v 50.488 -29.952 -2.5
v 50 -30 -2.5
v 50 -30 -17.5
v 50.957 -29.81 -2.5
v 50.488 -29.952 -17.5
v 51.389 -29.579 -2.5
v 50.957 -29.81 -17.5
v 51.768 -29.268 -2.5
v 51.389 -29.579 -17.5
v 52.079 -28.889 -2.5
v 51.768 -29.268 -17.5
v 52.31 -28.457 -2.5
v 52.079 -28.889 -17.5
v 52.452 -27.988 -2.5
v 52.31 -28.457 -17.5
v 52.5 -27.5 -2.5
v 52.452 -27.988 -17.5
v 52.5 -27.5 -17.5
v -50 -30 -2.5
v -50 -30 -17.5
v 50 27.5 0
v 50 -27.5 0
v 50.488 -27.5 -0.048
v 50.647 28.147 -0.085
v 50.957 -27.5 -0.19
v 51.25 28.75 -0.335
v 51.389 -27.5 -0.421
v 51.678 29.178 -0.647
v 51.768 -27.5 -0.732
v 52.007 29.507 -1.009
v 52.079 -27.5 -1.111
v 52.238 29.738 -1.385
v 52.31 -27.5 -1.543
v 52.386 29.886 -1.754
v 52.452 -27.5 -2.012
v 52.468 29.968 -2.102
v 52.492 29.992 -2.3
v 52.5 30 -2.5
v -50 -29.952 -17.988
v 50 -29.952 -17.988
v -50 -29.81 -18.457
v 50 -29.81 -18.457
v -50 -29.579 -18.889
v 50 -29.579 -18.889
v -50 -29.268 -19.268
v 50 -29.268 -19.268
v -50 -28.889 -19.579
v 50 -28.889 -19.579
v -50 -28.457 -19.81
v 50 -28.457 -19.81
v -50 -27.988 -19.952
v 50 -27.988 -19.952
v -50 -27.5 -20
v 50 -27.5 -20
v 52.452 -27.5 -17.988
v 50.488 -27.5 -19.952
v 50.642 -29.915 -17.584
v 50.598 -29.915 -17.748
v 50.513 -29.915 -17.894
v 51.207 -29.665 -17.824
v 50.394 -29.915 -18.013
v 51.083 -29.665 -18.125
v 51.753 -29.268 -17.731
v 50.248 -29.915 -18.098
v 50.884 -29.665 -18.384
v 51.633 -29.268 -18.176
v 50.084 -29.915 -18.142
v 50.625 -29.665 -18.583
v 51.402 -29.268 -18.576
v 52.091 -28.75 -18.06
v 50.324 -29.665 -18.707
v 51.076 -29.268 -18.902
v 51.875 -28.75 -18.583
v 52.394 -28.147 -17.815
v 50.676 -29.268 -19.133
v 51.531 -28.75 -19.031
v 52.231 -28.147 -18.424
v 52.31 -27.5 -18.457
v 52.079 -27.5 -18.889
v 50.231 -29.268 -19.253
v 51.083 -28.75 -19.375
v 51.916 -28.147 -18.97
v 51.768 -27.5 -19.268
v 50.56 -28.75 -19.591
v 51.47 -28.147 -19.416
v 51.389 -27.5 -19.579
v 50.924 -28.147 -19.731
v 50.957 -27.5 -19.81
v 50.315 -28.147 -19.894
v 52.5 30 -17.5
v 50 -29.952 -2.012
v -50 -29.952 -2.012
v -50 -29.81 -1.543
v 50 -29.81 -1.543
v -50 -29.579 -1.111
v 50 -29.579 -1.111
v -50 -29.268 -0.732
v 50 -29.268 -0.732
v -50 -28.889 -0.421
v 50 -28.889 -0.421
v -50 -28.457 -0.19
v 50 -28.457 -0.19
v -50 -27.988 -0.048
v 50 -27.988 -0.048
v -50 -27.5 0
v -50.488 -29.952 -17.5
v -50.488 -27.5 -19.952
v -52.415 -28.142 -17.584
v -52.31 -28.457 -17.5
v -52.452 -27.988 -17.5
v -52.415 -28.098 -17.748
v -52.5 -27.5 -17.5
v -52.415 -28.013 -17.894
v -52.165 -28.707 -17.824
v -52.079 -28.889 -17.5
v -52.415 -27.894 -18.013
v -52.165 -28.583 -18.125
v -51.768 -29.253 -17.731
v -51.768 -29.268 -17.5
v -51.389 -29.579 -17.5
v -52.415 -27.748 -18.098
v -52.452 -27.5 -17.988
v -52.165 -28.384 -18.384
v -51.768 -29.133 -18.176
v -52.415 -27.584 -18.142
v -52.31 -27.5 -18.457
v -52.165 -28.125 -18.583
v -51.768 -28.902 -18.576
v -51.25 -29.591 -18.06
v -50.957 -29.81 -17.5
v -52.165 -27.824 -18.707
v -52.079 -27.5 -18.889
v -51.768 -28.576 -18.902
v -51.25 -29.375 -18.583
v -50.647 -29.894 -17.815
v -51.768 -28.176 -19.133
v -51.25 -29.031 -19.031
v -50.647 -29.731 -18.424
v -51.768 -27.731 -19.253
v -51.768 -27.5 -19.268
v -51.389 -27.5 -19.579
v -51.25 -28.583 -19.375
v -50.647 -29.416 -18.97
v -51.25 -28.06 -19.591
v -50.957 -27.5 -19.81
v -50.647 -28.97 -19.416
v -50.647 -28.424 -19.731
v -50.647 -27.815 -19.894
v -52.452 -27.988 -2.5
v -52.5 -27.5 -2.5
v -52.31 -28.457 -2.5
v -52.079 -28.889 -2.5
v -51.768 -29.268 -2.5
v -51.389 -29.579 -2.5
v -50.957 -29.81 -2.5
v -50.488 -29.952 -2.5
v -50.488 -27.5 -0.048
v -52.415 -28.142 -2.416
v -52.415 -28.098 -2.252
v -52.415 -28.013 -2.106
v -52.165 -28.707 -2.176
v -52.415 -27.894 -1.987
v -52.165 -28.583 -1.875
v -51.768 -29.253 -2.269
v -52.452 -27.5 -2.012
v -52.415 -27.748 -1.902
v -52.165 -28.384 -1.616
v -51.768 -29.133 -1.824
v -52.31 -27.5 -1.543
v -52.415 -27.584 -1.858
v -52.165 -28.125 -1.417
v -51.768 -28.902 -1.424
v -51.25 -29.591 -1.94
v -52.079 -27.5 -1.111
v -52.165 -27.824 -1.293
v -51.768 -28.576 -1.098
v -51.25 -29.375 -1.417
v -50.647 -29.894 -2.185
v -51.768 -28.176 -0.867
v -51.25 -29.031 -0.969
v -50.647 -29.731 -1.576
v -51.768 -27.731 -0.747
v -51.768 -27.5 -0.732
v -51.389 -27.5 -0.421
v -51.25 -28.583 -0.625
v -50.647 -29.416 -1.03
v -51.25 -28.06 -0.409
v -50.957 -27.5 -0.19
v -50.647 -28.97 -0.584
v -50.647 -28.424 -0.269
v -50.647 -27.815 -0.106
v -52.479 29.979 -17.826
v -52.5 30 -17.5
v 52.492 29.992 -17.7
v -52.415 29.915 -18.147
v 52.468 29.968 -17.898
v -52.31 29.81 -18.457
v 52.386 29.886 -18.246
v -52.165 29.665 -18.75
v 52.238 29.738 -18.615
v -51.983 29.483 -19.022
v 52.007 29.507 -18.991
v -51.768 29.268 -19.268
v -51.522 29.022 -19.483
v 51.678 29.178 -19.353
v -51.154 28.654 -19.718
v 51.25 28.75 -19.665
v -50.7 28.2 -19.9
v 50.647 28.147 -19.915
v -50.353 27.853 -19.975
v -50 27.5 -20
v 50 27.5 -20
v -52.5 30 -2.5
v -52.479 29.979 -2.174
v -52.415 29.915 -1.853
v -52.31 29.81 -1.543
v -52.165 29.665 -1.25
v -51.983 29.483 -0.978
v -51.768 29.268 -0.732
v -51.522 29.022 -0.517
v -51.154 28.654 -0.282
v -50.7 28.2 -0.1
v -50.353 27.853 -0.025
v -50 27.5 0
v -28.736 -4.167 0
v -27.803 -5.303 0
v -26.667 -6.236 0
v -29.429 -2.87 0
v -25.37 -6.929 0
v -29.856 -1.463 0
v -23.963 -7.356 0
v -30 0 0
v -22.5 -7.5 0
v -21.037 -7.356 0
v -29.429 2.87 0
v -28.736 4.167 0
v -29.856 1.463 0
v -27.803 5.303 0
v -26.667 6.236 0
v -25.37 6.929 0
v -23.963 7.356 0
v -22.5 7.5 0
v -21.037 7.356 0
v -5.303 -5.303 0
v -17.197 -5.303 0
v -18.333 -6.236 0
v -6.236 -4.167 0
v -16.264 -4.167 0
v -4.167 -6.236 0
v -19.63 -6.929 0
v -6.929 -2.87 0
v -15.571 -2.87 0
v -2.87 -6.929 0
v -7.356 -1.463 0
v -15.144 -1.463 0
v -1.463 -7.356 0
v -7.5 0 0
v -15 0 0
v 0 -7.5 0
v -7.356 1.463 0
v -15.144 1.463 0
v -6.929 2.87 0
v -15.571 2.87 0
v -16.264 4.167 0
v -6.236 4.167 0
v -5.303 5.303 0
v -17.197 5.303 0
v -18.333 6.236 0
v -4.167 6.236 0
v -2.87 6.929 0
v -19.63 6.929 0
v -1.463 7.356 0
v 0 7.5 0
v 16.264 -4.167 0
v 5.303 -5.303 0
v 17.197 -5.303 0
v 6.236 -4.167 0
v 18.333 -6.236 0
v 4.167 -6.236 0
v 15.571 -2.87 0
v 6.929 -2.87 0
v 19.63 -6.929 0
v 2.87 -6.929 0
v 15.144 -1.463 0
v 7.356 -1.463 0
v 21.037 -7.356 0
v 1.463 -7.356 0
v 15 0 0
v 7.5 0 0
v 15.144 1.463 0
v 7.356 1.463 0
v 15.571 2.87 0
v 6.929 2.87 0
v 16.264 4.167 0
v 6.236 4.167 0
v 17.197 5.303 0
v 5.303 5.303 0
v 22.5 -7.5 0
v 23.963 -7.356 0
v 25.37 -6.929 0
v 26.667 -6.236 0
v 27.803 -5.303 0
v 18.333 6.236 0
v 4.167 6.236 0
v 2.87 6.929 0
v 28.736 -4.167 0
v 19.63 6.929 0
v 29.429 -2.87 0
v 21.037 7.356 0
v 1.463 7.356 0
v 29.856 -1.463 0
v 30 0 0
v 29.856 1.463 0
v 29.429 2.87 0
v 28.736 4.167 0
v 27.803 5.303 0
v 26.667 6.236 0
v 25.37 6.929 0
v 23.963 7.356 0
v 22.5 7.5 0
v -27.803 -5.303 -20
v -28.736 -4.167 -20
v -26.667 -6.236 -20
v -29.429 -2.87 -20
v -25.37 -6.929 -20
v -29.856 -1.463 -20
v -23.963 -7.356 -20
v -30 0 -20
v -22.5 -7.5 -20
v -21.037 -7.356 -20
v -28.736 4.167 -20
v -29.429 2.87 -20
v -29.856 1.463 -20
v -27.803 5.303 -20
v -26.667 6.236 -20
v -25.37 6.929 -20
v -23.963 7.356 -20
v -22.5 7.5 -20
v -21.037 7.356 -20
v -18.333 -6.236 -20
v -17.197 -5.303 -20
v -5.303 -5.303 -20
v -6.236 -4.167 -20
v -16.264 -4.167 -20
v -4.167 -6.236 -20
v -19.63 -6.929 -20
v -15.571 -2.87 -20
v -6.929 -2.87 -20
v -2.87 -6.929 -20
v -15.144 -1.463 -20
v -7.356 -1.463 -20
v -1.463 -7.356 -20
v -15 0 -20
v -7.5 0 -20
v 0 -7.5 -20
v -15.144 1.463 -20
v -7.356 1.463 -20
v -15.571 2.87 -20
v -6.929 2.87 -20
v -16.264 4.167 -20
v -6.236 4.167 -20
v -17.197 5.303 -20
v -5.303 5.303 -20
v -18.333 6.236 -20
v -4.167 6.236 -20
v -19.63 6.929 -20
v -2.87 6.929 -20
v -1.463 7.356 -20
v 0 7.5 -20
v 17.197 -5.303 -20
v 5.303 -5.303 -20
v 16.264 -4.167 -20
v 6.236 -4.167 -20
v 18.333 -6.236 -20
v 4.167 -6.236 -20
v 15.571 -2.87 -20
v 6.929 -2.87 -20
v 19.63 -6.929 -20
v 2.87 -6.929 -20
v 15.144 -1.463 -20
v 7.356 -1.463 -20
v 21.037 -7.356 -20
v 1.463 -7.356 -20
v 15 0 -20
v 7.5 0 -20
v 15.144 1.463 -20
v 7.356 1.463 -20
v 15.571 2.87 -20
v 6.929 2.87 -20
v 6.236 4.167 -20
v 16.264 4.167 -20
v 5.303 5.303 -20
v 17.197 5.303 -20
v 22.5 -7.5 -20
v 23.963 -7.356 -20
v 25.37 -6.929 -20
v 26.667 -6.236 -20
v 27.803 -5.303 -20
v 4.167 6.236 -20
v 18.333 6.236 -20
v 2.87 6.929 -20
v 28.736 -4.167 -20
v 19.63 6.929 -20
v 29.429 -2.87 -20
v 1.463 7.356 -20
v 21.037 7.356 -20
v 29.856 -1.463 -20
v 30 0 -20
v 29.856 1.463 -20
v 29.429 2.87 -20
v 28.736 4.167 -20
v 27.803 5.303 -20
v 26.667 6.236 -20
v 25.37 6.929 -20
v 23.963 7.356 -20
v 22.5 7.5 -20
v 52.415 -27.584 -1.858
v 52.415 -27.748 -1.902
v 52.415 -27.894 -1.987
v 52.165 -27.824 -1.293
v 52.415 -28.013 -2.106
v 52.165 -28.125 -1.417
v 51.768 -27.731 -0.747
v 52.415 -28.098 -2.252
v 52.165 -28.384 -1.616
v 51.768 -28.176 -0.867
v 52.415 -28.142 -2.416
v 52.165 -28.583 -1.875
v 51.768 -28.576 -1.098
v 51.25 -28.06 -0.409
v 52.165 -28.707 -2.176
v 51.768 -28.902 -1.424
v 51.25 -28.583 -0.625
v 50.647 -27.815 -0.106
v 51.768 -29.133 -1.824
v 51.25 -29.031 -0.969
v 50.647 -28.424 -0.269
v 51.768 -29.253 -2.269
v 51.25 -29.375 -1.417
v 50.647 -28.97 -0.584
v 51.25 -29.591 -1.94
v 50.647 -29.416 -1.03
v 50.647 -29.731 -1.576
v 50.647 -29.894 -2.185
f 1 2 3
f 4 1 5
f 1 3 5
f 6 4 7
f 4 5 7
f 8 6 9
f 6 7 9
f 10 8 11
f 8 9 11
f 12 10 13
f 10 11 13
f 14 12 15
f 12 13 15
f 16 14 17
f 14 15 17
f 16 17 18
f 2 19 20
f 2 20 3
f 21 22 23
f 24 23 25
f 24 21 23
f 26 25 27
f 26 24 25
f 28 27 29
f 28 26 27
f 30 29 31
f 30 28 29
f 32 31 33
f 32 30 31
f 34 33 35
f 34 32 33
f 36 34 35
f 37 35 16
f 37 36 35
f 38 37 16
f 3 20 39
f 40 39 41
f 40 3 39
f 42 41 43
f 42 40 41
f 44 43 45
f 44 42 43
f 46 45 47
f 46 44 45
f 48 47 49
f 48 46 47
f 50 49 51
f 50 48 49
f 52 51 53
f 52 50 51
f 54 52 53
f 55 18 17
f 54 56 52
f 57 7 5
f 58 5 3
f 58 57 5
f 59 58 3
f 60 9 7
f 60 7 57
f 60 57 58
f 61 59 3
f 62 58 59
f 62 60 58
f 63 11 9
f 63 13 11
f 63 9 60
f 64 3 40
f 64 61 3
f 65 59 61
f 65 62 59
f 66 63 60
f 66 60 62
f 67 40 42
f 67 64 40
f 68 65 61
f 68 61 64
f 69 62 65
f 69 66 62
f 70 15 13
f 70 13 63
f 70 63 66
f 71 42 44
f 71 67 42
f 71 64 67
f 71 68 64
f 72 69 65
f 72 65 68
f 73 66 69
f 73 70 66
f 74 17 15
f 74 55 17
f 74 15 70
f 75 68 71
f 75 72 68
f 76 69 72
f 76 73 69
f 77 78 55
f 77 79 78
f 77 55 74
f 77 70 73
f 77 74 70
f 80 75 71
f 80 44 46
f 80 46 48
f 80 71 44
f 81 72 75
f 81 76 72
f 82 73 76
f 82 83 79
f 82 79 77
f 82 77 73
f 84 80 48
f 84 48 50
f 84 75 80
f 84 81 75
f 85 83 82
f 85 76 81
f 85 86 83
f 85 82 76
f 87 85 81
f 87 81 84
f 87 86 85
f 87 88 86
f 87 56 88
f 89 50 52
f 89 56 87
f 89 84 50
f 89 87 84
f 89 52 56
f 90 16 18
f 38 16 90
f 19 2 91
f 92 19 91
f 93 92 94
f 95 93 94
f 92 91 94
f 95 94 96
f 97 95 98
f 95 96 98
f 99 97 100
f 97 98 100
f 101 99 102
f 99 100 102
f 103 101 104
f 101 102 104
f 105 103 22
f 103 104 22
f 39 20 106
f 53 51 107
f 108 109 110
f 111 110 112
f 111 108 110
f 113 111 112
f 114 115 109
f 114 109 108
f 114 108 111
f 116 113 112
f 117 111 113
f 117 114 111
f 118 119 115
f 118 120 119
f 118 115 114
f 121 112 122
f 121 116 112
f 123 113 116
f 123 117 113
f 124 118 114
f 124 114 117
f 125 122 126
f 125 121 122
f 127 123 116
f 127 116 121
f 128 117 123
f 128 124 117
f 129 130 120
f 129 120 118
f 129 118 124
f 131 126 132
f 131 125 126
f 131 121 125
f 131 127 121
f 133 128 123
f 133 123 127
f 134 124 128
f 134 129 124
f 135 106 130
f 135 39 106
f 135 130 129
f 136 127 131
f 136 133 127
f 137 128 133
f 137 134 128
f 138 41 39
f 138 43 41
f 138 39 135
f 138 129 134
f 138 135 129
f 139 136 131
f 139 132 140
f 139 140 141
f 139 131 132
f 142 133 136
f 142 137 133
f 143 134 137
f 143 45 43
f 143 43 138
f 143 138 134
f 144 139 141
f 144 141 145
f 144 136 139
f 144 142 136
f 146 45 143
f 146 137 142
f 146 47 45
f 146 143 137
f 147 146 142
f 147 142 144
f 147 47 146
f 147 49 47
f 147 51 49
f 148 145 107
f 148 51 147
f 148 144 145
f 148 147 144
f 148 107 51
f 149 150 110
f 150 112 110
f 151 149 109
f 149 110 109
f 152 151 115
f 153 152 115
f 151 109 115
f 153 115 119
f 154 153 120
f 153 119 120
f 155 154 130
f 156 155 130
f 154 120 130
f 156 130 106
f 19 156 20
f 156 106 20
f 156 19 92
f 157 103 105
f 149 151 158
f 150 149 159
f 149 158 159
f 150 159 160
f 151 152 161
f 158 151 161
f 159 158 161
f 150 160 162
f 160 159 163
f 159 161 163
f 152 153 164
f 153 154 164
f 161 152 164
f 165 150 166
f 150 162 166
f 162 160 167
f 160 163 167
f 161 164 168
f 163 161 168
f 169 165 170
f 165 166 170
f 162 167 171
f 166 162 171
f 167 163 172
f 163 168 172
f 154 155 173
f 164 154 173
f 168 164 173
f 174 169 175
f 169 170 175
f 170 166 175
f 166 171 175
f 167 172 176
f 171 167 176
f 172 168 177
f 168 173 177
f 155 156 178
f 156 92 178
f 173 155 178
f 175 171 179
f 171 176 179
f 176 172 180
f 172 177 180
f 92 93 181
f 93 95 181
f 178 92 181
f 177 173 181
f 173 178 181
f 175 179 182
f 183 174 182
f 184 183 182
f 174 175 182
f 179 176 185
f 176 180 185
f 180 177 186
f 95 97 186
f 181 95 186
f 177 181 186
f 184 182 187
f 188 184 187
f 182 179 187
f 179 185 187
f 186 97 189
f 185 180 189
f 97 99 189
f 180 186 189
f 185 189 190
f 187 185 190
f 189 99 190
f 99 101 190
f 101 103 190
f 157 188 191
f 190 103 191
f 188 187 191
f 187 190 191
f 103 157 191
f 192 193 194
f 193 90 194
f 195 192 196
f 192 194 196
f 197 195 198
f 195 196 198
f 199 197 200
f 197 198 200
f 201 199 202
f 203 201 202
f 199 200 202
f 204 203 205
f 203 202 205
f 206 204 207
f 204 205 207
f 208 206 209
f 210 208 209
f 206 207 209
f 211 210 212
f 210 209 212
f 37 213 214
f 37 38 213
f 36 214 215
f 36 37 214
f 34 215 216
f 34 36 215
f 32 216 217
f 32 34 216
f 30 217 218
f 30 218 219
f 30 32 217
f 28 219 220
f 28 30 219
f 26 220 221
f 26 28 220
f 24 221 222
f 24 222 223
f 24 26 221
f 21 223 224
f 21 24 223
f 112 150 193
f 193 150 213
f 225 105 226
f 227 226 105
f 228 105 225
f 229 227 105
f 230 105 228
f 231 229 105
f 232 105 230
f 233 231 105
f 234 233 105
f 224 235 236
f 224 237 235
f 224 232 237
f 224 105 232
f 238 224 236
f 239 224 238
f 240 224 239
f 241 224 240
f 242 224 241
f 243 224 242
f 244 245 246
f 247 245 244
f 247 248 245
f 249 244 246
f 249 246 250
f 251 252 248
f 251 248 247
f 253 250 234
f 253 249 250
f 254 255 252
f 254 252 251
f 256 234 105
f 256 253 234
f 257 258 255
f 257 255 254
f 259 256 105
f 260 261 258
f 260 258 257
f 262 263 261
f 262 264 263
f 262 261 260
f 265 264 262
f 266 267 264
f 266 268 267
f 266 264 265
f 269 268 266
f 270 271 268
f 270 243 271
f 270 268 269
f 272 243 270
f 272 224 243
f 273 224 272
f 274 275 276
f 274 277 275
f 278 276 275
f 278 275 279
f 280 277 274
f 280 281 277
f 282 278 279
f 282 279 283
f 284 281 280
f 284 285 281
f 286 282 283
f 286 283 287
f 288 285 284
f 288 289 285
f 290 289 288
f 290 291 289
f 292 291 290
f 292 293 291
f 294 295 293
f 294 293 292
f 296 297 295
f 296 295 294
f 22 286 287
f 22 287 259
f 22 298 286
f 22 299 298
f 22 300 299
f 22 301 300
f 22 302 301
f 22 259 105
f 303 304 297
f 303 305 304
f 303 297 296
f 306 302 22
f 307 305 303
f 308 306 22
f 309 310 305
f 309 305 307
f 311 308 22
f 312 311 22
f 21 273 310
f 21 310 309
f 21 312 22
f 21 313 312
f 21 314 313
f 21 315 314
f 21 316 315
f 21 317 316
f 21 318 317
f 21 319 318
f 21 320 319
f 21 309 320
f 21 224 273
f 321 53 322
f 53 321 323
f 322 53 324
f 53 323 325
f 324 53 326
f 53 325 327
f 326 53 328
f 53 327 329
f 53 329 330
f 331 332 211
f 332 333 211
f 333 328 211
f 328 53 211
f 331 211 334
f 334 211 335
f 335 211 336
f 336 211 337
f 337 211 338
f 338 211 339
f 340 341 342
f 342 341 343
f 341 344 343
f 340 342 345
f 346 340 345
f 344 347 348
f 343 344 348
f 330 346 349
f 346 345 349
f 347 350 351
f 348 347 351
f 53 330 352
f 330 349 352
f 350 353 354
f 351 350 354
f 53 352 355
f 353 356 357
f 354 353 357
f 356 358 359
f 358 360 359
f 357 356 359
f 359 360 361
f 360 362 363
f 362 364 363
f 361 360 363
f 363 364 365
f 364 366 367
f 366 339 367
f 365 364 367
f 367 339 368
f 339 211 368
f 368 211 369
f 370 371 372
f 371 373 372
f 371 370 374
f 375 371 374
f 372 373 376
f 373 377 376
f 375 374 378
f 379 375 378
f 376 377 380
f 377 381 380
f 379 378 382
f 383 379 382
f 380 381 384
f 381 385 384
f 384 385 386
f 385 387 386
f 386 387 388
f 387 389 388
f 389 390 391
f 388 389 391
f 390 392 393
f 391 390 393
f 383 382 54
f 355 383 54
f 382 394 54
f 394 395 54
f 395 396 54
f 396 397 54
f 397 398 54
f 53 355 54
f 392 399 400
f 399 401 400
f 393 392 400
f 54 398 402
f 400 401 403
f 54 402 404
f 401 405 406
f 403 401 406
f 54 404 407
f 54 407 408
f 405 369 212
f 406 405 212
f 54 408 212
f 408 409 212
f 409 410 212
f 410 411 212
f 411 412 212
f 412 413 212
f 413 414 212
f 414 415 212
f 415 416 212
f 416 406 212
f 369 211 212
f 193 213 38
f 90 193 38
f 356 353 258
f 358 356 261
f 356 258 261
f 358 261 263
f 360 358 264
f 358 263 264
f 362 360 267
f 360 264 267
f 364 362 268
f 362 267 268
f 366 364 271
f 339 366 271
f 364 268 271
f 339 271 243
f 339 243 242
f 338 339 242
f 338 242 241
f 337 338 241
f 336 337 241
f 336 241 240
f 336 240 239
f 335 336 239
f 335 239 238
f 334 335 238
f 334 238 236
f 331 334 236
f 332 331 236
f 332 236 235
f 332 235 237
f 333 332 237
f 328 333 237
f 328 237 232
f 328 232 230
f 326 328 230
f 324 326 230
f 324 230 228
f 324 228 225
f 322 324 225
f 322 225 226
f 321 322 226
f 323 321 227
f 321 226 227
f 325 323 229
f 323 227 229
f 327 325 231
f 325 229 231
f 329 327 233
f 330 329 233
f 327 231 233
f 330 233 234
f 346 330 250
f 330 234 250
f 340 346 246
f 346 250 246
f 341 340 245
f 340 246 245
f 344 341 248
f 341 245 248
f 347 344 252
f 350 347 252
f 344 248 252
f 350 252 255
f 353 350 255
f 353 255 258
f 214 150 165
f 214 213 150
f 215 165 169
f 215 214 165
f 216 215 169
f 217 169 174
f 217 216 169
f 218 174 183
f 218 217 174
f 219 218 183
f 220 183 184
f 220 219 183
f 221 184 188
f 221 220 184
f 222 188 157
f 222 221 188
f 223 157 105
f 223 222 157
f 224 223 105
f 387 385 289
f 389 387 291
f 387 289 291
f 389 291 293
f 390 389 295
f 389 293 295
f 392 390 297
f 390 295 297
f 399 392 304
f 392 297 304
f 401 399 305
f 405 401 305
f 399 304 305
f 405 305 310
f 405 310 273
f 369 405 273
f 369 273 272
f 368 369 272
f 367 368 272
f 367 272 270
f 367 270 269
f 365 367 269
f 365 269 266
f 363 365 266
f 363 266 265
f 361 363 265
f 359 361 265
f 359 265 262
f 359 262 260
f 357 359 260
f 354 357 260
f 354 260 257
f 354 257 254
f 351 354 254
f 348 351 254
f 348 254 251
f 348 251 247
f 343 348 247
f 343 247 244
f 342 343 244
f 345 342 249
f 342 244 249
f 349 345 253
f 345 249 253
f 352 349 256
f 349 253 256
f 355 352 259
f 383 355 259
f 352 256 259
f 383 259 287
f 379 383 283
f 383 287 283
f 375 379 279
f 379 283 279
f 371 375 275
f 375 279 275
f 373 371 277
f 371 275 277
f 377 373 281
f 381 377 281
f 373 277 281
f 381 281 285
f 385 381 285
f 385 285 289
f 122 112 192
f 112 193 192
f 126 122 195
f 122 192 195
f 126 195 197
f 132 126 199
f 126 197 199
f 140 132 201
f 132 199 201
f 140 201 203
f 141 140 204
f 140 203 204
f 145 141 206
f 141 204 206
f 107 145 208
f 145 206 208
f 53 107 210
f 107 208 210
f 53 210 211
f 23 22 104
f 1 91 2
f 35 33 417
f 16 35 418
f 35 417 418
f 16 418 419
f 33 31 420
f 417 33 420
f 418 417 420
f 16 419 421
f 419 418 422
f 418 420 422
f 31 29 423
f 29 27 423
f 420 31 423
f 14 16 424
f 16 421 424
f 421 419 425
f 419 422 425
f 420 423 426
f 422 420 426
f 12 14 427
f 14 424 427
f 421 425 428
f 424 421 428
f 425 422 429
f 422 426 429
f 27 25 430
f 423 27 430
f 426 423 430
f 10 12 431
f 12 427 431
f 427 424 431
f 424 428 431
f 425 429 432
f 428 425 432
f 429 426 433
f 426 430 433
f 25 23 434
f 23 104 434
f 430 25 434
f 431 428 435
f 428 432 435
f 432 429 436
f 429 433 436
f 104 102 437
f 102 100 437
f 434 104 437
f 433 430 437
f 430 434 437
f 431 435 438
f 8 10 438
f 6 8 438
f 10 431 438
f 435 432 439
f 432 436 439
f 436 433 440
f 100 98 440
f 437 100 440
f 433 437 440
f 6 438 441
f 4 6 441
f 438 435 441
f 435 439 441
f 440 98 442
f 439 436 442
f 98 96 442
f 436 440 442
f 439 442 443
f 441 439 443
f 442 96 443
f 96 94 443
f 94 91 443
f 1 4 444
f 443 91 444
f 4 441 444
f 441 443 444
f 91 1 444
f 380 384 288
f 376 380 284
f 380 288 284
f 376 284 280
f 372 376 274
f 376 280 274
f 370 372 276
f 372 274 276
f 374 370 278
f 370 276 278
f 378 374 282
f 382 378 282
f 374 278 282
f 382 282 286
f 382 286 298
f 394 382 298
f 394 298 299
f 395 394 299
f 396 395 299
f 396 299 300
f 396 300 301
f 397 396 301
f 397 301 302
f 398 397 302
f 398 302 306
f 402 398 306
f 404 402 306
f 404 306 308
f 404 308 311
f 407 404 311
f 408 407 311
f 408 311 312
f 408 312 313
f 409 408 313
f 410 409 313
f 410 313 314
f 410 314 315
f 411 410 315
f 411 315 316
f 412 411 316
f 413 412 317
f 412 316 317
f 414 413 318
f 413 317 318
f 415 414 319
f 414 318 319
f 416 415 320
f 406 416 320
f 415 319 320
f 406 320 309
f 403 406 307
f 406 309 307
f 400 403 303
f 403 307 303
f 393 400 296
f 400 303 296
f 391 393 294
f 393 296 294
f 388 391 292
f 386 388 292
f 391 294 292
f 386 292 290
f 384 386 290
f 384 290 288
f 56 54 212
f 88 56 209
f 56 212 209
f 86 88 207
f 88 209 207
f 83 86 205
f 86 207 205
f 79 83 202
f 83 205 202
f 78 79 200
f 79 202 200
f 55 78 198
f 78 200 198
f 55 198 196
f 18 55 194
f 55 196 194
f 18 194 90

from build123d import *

# Parameters (mm, degrees)
F0_W     = 105
F0_H     = 60
F1_DEPTH = 20
F2_R     = 7.5
F3_DEPTH = 68.6
F4_DEPTH = 55.5
F5_R     = 2.5


with BuildPart() as f1:
    # F0 (on Top) → F1 (new body)
    with BuildSketch(Plane.XY):
        Rectangle(F0_W, F0_H)
    extrude(amount=-F1_DEPTH)

    # F2 (on face) → F3 (cut)
    with BuildSketch(Plane.XY):
        with BuildLine():
            ThreePointArc((-7.5, 0), (0, -7.5), (7.5, 0))
            ThreePointArc((7.5, 0), (0, 7.5), (-7.5, 0))
        make_face()
        with Locations((-22.5, 0)):
            Circle(F2_R)
        with BuildLine():
            ThreePointArc((30, 0), (22.5, 7.5), (15, 0))
            ThreePointArc((15, 0), (22.5, -7.5), (30, 0))
        make_face()
    extrude(amount=-F3_DEPTH, mode=Mode.SUBTRACT)

    # F2 (on face) → F4 (cut)
    with BuildSketch(Plane.XY):
        with BuildLine():
            ThreePointArc((-7.5, 0), (0, -7.5), (7.5, 0))
            ThreePointArc((7.5, 0), (0, 7.5), (-7.5, 0))
        make_face()
        with Locations((-22.5, 0)):
            Circle(F2_R)
        with BuildLine():
            ThreePointArc((30, 0), (22.5, 7.5), (15, 0))
            ThreePointArc((15, 0), (22.5, -7.5), (30, 0))
        make_face()
    extrude(amount=-F4_DEPTH, mode=Mode.SUBTRACT)

    # F5
    f5_edges = [f1.edges().sort_by_distance(p)[0] for p in [
        (0, -30, 0),
        (52.5, 0, 0),
        (52.5, 0, -20),
        (52.5, -30, -10),
        (0, -30, -20),
        (-52.5, -30, -10),
        (-52.5, 0, 0),
        (-52.5, 0, -20),
        (0, 30, 0),
        (0, 30, -20),
    ]]
    fillet(f5_edges, radius=F5_R)


solid = f1.part
